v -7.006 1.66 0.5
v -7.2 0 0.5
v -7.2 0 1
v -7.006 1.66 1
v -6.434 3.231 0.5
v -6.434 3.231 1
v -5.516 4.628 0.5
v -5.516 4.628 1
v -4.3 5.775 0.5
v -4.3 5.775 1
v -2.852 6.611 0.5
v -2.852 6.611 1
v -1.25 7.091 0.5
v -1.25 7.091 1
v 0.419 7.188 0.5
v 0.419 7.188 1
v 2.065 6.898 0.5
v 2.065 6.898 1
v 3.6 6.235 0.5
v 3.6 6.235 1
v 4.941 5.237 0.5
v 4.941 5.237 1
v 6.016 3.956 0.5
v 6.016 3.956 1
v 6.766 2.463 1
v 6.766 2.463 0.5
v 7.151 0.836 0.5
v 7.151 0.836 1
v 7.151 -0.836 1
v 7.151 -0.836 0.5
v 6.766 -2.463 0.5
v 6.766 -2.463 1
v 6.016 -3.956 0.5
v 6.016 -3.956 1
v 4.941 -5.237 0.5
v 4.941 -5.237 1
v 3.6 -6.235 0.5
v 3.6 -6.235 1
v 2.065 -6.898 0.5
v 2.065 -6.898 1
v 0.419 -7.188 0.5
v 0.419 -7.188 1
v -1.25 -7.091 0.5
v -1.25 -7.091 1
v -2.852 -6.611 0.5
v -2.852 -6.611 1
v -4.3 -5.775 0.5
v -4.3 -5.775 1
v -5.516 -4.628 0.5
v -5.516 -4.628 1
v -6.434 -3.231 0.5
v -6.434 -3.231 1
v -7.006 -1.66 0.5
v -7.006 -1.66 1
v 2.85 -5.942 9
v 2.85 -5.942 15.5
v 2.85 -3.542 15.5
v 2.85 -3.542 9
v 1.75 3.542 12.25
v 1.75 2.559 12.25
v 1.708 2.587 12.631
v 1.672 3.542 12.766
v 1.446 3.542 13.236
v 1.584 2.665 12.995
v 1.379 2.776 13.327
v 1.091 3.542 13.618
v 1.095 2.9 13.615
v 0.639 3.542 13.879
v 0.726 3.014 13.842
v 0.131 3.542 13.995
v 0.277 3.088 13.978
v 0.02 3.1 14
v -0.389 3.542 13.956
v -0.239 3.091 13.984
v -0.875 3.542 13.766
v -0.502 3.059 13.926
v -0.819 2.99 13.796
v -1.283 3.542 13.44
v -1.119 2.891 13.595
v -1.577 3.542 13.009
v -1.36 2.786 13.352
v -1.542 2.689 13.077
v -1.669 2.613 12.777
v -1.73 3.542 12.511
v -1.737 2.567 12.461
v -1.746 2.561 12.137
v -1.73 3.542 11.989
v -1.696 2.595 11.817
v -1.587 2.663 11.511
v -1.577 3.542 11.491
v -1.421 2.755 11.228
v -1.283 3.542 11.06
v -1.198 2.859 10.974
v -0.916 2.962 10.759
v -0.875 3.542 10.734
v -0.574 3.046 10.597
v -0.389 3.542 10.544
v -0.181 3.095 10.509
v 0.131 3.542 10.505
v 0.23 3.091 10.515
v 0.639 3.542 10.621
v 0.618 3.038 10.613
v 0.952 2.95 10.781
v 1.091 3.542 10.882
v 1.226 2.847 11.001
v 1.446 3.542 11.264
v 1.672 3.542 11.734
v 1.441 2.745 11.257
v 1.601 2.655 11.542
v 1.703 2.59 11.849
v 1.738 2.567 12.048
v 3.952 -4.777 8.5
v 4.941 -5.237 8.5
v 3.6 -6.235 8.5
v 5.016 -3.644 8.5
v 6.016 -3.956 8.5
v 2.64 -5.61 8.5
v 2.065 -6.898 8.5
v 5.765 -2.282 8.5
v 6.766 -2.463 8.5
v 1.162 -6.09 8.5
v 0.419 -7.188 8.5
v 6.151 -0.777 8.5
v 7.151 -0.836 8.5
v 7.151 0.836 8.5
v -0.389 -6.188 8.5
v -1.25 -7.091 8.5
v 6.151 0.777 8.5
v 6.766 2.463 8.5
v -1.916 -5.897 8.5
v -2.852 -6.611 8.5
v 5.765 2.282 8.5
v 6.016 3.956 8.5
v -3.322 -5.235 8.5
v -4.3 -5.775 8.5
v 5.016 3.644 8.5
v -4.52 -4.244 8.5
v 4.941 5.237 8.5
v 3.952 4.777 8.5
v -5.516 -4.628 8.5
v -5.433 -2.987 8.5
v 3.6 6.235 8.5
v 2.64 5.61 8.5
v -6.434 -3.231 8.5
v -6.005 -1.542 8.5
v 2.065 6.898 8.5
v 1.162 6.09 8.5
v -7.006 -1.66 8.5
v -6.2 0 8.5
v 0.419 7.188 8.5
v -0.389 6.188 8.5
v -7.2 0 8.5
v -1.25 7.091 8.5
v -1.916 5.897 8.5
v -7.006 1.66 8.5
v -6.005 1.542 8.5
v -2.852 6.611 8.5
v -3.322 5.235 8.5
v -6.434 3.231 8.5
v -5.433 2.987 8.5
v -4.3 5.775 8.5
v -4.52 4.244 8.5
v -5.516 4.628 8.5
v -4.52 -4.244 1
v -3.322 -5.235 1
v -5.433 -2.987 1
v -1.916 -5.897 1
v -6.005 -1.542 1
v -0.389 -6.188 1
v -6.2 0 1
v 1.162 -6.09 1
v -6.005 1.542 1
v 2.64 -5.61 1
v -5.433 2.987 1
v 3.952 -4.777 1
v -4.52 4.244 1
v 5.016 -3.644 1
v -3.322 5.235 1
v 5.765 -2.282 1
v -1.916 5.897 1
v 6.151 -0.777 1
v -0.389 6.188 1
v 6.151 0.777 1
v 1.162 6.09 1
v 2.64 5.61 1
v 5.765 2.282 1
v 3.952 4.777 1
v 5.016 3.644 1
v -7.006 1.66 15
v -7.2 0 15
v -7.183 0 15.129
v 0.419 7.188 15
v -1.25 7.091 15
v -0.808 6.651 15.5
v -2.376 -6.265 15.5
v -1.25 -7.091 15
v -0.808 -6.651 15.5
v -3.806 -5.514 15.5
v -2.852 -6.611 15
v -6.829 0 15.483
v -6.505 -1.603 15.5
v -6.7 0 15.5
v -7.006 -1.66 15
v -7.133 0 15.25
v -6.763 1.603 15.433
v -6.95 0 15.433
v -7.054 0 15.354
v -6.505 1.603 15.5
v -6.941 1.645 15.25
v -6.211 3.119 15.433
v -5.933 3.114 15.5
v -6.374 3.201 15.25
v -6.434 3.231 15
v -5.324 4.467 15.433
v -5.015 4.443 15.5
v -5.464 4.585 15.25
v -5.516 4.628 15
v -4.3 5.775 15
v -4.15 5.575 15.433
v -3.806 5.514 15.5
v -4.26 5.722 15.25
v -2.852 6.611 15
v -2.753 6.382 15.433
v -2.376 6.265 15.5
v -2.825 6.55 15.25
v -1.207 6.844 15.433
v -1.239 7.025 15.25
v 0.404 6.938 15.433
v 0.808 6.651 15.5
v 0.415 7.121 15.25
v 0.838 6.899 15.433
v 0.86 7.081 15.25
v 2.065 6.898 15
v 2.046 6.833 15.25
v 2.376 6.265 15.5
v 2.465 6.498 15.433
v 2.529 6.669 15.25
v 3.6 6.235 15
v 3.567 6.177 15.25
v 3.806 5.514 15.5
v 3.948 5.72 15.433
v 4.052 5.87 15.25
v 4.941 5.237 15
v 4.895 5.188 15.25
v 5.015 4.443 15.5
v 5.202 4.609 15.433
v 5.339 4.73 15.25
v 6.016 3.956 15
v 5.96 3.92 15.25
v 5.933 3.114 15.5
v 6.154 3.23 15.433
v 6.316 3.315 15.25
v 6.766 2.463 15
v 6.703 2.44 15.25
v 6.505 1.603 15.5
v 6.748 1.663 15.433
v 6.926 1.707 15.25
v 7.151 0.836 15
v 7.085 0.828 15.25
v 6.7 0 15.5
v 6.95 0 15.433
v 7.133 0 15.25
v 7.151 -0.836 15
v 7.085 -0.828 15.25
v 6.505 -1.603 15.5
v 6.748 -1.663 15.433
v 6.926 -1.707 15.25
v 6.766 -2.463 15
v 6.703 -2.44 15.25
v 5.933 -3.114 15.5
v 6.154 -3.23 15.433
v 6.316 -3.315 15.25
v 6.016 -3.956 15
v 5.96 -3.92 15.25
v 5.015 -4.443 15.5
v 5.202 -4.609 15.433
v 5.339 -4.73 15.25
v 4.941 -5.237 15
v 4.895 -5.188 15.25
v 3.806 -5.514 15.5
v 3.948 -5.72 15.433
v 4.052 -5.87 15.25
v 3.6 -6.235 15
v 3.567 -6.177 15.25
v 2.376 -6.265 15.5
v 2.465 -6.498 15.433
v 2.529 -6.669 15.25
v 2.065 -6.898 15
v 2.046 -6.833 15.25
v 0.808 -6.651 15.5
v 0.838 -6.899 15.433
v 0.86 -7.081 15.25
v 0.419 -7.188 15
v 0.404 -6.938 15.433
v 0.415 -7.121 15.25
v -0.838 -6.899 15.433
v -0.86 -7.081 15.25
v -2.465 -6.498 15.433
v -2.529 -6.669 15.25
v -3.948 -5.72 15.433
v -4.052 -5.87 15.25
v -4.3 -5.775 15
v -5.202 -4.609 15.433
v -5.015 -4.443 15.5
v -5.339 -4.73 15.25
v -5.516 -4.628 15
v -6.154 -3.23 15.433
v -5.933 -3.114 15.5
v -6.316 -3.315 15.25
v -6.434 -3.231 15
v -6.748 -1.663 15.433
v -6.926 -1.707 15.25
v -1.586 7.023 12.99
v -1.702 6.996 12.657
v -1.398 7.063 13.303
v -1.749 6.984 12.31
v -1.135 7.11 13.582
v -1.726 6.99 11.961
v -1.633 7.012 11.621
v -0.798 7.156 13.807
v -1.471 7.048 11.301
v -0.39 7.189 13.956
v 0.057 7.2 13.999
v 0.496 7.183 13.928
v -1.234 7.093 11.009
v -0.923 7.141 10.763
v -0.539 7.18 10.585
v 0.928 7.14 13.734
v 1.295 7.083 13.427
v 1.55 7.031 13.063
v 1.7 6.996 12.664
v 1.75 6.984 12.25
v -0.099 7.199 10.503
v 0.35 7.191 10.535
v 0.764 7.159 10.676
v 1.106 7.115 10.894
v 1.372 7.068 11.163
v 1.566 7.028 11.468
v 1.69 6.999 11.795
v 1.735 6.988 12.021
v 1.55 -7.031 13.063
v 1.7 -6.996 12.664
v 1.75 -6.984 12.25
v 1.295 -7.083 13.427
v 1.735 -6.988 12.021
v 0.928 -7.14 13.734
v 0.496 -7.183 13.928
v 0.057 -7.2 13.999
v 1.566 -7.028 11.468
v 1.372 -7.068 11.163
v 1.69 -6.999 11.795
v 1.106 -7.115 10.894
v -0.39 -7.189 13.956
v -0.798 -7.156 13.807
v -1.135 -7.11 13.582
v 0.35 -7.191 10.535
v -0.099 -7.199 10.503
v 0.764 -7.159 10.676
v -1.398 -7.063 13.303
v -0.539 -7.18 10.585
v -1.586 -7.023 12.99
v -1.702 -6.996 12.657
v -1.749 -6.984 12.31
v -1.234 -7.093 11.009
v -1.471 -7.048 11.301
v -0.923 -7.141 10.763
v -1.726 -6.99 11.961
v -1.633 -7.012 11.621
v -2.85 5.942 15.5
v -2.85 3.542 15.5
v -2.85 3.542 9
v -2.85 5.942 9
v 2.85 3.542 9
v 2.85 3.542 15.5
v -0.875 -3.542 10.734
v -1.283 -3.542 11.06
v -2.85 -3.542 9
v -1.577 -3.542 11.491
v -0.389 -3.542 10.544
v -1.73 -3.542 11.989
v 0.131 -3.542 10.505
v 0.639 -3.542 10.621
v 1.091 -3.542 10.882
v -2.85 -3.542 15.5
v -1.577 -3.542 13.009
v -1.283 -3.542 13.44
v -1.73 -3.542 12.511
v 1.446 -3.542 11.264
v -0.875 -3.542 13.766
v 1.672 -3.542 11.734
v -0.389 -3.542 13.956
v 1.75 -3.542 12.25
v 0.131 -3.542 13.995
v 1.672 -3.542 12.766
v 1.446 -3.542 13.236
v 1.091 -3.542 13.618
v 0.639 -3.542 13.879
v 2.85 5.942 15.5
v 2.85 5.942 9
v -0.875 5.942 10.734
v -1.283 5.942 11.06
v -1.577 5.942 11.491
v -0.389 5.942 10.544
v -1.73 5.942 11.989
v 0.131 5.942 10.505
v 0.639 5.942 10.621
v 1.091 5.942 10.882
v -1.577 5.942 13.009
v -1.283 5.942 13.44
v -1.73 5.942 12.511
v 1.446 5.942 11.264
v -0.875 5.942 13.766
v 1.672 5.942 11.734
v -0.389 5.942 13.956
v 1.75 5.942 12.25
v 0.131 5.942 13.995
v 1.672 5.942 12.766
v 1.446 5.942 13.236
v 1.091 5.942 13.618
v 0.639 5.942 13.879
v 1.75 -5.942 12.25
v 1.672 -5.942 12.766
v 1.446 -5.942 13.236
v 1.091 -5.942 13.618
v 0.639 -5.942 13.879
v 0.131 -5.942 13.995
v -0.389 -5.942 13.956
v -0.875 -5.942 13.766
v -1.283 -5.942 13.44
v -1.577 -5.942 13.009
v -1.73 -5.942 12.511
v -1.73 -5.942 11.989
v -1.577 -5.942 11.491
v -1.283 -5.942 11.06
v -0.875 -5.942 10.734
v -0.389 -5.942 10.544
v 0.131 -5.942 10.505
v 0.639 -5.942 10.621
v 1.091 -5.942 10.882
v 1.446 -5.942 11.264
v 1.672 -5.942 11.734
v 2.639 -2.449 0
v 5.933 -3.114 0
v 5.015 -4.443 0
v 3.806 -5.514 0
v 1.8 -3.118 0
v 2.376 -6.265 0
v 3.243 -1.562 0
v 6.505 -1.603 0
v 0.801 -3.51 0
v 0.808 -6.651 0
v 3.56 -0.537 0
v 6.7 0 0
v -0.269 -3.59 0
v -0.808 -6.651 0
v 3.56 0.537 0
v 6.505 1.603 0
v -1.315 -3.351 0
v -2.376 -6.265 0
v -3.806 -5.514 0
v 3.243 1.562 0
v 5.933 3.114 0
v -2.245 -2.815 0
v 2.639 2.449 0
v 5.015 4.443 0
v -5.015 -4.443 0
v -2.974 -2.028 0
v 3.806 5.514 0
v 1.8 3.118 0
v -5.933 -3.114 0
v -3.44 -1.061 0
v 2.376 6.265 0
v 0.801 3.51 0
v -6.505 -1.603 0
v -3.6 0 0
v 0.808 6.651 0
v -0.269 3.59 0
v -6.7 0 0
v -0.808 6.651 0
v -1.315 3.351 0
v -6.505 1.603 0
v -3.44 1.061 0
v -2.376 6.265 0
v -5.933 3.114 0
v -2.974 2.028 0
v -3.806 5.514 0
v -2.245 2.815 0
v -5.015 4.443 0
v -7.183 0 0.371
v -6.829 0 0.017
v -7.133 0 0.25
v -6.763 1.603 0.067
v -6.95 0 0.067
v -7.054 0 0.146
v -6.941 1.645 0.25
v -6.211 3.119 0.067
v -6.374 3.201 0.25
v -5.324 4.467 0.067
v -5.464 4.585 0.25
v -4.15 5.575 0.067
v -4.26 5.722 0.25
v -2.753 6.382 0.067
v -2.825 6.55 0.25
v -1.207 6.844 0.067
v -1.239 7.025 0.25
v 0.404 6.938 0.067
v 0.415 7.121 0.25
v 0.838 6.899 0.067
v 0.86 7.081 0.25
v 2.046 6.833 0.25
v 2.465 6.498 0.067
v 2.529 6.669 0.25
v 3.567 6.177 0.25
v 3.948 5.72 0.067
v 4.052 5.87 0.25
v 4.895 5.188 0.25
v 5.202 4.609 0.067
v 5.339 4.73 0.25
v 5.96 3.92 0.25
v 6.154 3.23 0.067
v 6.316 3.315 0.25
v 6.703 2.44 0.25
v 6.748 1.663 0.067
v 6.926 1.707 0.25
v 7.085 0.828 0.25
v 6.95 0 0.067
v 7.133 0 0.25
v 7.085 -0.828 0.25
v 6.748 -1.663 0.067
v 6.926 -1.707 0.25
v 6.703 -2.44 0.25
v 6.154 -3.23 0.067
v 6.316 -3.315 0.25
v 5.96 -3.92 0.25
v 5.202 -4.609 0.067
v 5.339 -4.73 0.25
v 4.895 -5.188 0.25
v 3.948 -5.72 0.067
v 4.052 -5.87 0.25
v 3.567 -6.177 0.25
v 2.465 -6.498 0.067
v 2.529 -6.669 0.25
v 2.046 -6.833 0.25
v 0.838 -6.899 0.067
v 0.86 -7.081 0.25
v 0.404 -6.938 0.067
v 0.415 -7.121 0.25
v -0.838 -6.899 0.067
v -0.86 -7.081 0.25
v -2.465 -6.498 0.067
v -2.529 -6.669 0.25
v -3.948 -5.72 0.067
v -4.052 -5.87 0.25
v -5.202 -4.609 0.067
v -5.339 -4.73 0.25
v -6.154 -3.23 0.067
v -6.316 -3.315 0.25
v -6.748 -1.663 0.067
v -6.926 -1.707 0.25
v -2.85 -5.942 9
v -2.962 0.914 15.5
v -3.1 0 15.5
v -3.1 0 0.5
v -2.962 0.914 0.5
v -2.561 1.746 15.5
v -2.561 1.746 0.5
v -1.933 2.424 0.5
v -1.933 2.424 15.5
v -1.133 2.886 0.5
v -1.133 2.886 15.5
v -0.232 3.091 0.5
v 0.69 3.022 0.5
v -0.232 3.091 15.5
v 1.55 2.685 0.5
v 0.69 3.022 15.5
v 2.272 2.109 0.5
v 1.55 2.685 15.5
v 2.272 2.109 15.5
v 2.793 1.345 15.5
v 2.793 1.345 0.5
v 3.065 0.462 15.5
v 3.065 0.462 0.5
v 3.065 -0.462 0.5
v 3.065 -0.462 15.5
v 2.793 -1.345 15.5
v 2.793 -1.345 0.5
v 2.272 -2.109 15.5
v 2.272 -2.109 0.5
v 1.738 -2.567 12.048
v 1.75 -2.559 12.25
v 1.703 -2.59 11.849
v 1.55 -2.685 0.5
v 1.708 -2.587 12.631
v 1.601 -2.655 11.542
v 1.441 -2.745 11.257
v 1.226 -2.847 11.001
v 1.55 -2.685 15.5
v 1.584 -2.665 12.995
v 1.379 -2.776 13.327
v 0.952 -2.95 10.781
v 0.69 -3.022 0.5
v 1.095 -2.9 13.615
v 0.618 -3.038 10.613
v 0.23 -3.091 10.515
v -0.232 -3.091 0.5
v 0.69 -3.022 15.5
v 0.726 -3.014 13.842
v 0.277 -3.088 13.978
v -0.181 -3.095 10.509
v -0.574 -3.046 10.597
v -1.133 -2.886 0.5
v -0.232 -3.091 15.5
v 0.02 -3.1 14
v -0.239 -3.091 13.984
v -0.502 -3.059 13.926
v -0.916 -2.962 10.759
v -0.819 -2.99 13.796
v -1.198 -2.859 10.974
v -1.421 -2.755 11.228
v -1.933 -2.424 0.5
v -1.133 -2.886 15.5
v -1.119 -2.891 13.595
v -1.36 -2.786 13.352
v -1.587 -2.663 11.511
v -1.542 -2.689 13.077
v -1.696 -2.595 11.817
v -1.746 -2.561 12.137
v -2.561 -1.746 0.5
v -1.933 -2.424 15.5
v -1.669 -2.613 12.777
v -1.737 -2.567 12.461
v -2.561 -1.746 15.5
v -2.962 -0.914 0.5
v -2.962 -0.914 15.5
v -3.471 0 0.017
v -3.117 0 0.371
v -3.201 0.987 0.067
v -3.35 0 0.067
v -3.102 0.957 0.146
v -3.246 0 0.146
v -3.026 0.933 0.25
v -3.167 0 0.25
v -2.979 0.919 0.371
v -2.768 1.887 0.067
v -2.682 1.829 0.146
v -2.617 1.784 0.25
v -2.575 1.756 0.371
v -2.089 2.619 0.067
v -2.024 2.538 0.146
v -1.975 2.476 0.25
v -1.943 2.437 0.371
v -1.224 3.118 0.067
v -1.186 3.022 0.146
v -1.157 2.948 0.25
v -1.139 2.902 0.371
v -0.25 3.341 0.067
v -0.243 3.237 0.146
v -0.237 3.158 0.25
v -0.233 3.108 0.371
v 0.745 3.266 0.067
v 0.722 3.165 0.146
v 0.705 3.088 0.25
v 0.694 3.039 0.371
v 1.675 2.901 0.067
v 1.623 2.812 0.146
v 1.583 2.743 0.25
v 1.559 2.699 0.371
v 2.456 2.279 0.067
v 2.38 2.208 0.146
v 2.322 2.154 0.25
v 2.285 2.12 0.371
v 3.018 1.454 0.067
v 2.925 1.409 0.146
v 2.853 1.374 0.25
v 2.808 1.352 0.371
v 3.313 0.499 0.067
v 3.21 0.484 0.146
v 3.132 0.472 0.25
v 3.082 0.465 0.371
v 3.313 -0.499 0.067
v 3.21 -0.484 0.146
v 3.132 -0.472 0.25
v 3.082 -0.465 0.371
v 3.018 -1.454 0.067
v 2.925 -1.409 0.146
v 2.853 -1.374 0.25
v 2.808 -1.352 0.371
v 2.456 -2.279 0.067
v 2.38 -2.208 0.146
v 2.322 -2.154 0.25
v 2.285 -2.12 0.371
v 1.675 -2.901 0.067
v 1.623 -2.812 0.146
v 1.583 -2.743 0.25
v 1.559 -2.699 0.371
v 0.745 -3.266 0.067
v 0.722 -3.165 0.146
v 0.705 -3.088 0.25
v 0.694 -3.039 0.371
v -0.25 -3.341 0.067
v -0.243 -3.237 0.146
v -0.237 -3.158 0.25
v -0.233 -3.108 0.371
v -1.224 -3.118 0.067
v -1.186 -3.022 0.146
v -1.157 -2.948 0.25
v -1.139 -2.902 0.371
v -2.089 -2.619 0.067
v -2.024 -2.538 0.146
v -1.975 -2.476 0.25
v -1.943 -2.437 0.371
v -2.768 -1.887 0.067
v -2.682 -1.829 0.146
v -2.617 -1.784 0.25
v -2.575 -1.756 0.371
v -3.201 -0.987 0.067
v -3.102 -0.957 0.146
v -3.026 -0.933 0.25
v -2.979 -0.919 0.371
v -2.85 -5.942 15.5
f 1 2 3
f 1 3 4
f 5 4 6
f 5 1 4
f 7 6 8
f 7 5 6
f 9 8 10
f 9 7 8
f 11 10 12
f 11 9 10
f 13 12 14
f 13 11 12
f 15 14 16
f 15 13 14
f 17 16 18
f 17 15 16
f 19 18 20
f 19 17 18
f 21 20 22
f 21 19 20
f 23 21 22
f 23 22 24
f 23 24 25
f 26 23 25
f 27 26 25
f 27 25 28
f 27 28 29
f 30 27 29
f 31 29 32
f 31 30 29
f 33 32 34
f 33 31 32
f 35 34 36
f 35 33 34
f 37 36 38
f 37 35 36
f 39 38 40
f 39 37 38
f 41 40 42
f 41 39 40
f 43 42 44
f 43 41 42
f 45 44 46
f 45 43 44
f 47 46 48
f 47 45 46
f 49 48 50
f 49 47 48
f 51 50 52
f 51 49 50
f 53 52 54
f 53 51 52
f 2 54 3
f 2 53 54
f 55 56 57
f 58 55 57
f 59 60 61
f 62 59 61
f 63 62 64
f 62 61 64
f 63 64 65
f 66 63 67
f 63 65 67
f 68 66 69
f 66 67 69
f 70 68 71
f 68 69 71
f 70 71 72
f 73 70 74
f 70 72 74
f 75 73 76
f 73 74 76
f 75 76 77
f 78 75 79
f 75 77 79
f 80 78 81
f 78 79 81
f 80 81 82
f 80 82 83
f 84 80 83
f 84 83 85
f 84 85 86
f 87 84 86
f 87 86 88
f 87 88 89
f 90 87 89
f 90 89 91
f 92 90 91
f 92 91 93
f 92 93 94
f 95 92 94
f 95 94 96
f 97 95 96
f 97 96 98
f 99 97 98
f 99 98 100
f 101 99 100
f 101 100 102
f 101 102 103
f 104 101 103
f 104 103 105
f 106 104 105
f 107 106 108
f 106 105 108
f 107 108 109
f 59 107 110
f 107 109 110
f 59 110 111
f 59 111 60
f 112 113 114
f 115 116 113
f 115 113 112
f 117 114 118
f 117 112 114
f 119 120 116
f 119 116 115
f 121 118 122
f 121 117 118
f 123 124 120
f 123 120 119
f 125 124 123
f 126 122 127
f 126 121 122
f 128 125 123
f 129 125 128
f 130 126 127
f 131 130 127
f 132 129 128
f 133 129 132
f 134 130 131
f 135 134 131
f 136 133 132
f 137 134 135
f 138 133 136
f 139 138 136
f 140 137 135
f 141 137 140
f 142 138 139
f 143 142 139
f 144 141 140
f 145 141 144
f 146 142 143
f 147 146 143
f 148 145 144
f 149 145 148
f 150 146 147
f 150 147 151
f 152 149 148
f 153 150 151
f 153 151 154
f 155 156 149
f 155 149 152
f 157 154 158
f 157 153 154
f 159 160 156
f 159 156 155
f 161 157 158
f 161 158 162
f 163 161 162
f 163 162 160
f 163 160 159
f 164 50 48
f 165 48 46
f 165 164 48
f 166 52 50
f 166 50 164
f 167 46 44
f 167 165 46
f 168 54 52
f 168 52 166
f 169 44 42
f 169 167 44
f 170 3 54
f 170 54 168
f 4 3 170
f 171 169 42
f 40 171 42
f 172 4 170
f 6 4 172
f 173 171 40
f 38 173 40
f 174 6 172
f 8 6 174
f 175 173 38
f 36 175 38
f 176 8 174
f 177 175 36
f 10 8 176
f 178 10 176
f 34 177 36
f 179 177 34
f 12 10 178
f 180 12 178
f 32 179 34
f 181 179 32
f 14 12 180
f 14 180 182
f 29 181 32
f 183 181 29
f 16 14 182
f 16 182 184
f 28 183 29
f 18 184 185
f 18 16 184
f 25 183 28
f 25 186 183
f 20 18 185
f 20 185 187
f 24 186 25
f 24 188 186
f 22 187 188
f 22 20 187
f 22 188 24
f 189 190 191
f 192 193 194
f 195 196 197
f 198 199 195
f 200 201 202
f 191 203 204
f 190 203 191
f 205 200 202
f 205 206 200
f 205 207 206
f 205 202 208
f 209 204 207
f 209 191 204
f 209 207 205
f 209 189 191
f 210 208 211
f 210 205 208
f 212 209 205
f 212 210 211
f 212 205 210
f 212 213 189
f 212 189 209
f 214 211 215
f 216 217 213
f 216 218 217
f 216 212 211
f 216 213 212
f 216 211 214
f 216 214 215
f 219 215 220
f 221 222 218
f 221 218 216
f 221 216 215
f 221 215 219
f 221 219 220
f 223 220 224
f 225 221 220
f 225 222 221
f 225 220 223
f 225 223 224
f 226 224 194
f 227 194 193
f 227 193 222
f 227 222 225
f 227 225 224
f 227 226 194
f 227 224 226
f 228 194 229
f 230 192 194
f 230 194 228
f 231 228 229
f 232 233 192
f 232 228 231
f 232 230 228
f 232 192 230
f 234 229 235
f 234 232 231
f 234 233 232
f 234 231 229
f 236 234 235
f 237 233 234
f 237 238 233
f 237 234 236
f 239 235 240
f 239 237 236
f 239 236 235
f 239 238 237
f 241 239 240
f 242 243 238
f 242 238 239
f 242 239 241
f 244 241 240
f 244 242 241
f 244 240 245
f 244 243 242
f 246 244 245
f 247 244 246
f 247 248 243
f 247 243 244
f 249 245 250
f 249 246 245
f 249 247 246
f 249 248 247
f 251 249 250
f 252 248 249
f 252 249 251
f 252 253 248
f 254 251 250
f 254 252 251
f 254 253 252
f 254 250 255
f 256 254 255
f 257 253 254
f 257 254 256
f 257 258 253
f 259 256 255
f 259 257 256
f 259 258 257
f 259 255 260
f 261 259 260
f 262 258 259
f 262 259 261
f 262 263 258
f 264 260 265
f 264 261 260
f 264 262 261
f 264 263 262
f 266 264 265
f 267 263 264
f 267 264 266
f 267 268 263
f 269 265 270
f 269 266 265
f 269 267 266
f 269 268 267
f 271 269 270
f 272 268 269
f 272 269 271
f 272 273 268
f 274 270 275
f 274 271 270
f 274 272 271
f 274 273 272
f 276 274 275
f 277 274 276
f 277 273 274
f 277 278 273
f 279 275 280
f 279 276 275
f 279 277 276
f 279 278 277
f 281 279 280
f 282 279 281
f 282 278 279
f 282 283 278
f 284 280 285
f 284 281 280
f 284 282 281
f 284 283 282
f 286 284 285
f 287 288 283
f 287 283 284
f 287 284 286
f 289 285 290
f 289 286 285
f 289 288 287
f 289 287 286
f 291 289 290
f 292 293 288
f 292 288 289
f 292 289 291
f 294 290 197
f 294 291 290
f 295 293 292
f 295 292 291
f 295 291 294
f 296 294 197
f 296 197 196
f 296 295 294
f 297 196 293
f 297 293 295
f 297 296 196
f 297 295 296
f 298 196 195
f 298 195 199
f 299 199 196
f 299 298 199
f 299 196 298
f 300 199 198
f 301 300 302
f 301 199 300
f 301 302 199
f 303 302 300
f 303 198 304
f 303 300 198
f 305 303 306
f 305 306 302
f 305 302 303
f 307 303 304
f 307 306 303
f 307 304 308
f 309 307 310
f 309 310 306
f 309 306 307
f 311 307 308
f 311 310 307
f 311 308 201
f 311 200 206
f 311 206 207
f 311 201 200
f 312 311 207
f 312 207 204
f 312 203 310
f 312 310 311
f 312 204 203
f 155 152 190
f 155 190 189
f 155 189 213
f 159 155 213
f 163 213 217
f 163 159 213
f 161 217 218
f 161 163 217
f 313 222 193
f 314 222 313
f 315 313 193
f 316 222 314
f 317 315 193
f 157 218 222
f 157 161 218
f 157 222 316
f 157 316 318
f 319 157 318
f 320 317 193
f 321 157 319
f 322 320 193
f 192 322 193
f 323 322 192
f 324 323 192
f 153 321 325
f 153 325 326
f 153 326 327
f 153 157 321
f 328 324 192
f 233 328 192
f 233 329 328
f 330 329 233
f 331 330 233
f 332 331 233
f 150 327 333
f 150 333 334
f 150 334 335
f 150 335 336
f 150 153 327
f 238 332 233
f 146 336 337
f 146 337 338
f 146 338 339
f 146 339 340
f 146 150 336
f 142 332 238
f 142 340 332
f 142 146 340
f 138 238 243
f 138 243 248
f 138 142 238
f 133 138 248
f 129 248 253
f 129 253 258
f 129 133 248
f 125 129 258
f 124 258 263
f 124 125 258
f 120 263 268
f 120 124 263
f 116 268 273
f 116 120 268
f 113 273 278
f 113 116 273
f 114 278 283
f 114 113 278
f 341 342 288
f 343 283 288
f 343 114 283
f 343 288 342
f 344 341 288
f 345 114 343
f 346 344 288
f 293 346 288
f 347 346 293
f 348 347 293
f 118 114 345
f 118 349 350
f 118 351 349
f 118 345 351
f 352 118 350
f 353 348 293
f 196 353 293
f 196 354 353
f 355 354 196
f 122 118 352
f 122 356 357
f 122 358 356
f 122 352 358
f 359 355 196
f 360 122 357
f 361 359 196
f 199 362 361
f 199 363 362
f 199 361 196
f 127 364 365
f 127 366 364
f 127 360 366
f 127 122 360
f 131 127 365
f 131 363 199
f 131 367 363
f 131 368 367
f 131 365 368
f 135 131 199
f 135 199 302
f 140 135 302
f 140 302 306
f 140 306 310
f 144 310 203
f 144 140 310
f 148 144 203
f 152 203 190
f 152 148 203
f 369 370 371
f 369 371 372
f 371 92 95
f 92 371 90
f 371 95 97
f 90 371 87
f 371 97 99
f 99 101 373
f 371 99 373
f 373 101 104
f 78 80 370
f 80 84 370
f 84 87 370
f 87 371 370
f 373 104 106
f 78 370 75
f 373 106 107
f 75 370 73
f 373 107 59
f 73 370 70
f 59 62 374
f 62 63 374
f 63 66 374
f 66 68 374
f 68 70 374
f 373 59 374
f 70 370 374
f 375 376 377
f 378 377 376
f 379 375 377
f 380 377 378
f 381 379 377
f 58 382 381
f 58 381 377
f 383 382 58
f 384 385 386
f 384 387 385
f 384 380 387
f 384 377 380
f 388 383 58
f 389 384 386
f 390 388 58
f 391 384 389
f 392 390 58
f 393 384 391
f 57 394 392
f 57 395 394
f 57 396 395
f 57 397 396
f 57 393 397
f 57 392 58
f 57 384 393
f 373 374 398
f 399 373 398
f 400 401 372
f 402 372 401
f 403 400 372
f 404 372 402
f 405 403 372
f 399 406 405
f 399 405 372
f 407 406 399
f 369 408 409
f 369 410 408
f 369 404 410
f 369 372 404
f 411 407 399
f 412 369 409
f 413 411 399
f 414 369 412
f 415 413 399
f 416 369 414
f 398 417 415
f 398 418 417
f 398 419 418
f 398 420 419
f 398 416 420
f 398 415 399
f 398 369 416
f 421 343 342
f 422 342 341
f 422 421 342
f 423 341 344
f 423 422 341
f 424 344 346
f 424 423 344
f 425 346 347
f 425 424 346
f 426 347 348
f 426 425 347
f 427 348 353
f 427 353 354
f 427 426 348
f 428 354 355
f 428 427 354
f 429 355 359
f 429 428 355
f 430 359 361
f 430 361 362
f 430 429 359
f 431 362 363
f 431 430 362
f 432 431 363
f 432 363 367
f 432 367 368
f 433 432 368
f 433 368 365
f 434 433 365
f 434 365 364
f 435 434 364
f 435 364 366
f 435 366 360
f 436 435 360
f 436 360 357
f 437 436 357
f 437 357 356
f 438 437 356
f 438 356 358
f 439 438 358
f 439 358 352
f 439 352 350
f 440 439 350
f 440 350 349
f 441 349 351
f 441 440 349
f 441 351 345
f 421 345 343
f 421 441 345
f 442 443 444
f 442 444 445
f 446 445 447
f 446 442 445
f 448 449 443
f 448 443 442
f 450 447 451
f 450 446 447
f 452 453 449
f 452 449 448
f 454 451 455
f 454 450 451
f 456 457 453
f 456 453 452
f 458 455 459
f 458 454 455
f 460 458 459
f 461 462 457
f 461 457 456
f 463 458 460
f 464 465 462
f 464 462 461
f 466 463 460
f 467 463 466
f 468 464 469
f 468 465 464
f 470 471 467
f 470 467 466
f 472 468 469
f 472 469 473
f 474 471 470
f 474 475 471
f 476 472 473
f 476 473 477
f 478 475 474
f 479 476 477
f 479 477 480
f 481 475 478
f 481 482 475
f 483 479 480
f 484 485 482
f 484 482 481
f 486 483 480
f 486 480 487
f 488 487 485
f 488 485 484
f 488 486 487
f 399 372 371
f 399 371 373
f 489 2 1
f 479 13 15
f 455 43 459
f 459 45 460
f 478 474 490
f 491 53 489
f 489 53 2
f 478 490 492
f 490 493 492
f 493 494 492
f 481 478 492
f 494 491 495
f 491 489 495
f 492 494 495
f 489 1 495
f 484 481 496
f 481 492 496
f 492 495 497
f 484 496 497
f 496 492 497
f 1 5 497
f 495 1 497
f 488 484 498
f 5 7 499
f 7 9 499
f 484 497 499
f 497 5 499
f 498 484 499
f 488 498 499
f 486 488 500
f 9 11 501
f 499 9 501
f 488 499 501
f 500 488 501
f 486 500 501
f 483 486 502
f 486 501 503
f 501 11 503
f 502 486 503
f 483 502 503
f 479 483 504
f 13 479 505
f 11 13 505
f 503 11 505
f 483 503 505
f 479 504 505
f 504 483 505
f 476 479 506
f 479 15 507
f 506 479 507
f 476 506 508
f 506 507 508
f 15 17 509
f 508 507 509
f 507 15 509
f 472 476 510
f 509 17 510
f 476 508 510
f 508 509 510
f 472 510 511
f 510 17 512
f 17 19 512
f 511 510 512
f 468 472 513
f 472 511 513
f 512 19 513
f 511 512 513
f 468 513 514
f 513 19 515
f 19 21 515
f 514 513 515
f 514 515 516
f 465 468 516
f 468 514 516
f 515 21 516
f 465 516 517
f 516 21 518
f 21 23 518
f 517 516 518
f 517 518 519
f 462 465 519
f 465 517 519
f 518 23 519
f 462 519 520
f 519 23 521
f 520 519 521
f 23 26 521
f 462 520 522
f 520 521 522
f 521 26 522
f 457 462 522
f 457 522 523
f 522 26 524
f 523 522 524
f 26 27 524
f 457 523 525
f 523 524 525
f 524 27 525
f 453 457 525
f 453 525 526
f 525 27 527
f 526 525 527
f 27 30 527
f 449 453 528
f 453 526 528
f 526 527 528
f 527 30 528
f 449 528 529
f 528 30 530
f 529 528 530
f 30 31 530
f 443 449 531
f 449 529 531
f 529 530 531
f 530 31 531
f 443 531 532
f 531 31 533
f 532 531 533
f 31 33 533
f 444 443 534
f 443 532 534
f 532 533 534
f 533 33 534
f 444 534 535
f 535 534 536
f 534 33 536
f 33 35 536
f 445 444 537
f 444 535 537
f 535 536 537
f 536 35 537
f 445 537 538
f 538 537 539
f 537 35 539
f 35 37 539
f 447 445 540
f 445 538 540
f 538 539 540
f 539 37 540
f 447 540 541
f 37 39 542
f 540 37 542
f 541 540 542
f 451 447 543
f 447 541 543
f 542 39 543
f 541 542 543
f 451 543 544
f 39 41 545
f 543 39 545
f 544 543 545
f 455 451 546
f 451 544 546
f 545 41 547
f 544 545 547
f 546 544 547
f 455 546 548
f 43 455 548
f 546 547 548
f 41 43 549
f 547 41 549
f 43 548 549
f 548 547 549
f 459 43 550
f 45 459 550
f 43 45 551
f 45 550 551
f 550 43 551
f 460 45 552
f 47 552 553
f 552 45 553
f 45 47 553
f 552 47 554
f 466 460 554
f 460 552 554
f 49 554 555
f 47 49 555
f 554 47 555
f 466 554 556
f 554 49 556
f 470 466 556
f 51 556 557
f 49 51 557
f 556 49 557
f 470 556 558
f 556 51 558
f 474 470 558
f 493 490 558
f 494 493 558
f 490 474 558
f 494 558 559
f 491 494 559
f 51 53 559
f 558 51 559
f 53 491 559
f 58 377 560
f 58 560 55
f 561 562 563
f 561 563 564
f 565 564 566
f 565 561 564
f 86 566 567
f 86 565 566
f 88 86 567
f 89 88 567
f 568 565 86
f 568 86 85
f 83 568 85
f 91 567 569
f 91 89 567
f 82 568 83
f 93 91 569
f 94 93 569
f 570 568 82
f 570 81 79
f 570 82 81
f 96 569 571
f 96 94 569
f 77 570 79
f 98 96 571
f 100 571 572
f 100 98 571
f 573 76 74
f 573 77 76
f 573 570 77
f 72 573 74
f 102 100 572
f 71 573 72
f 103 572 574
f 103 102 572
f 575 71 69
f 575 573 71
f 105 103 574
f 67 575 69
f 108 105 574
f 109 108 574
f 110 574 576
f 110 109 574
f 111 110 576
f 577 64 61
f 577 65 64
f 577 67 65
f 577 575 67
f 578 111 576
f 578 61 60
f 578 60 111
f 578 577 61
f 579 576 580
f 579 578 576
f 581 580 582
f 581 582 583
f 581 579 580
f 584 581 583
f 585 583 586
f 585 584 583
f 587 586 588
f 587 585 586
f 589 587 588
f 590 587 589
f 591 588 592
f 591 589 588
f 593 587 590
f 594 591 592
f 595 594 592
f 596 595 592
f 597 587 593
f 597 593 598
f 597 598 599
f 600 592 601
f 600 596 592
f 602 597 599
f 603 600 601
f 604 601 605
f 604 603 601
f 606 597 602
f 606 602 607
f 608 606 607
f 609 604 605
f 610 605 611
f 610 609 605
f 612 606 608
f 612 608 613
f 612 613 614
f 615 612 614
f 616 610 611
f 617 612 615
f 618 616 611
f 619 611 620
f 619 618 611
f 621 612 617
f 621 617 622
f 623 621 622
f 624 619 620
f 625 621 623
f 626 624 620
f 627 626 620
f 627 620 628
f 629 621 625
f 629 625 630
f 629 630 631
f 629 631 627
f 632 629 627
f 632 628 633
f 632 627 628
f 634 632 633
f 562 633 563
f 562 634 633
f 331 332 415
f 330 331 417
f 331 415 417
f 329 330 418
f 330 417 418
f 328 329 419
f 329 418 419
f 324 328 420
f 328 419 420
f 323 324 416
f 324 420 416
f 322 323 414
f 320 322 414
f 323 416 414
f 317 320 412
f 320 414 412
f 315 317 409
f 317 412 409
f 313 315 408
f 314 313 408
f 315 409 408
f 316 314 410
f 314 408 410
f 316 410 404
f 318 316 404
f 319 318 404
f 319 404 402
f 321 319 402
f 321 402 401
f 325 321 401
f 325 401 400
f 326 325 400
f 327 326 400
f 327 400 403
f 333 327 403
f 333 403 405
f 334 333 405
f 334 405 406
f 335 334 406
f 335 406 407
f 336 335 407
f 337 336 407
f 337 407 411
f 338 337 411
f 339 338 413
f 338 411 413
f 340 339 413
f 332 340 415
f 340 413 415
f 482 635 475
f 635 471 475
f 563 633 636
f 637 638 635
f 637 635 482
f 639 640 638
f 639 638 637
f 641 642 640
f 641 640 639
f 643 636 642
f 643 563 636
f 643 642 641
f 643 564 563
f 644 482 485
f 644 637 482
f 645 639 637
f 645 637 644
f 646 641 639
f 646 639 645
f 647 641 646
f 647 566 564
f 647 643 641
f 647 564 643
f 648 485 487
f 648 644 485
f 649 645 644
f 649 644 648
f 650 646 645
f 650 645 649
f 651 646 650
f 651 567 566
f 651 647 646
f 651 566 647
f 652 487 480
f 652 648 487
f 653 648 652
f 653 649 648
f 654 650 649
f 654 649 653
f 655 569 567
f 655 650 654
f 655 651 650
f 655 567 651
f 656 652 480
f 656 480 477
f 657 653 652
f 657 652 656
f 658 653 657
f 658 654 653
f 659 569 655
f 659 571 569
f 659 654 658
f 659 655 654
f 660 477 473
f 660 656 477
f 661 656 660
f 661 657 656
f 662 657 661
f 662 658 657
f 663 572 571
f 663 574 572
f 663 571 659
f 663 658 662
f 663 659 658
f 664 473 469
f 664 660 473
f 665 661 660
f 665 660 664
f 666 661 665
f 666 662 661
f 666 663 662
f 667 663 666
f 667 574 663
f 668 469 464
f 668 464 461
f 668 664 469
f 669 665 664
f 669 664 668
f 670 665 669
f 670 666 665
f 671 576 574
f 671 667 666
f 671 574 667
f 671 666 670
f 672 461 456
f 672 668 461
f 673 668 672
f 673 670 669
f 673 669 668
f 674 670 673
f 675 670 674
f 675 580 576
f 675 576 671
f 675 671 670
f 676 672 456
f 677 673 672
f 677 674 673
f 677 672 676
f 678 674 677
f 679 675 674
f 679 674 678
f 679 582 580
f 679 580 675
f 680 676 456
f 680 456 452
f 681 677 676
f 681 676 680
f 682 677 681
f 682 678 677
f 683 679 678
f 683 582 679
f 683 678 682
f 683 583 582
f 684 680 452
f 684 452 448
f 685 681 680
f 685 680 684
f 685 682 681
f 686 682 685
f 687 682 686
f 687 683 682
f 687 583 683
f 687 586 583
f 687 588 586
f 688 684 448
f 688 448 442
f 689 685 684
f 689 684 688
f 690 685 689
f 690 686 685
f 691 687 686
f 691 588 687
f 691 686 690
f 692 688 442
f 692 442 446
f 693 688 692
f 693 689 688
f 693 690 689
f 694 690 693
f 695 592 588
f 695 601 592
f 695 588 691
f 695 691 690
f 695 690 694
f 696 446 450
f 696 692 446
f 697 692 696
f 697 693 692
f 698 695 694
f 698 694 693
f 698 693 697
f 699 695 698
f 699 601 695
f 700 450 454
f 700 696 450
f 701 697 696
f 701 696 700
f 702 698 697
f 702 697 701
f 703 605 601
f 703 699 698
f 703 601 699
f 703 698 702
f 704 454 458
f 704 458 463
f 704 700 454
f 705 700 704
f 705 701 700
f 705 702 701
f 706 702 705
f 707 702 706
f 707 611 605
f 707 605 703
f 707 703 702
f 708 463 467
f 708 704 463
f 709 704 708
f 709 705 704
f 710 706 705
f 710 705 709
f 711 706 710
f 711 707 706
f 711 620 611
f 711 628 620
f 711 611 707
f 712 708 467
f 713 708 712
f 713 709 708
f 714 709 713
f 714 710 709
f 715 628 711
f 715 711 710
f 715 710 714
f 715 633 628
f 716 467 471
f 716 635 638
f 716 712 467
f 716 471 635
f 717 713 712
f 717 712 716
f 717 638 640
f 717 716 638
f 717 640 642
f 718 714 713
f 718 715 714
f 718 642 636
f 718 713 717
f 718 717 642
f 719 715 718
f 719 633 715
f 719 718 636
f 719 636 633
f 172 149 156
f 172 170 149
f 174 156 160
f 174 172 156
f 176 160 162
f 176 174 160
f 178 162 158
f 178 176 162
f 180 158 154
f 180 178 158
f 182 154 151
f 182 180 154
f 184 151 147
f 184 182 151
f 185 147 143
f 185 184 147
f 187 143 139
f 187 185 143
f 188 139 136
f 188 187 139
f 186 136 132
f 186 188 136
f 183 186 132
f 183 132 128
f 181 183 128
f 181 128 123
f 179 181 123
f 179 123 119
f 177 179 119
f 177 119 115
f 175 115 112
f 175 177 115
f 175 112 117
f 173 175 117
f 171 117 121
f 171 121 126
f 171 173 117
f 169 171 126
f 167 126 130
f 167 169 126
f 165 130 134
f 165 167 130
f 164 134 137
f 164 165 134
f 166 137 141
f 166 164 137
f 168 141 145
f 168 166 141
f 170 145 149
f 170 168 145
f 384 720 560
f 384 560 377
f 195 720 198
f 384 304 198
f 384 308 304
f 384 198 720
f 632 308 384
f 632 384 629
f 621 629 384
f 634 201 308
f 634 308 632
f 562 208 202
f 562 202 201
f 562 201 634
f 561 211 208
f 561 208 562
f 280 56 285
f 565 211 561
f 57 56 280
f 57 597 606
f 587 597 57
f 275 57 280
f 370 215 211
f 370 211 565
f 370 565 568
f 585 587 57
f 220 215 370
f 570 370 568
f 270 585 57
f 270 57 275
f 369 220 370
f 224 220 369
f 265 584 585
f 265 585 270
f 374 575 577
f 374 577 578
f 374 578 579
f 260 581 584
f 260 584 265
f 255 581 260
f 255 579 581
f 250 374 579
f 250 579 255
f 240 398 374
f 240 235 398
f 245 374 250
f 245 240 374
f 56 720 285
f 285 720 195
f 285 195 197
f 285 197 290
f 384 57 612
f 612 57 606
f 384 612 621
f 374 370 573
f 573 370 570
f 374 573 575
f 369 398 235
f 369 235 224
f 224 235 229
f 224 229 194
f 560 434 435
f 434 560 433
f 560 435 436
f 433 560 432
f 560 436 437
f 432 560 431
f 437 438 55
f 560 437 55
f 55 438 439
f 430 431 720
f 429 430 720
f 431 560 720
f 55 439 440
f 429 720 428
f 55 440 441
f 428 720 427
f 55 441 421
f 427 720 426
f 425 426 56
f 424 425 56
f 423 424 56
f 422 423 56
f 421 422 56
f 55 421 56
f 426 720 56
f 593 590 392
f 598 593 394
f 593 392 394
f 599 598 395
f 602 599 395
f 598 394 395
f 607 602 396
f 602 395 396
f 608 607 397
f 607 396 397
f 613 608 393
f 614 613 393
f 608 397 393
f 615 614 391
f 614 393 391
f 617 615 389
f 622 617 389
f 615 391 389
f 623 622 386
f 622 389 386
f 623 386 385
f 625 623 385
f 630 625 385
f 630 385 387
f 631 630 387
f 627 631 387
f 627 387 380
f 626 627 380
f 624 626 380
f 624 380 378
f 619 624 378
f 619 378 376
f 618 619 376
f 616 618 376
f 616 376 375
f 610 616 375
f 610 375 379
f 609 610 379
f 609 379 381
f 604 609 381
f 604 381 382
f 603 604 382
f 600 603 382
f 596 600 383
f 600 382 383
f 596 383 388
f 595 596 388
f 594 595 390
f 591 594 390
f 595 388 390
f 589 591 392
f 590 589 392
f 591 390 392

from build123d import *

# Parameters (mm, degrees)
F2_W          = 5.7
F2_H          = 2.4
F3_DEPTH      = 6.5
F4_R          = 1.75
F5_DEPTH      = 10.743375338
F5_DEPTH_BACK = 3.658624662
F6_R          = 0.5


with BuildPart() as f1:
    # F0 (on Front) → F1 (revolve)
    with BuildSketch(Plane.XZ):
        Polygon((-7.2, 0), (-3.1, 0), (-3.1, 15.5), (-7.2, 15.5), (-7.2, 8.5), (-6.2, 8.5), (-6.2, 1), (-7.2, 1), align=None)
    revolve(axis=Axis((0, 0, 7.75), (0, 0, -1)))

    # F2 (on face) → F3 (cut)
    with BuildSketch(Plane.XY.offset(15.5)):
        with Locations((0, -4.742375338)):
            Rectangle(F2_W, F2_H)
        with Locations((0, 4.742375338)):
            Rectangle(F2_W, F2_H)
    extrude(amount=-F3_DEPTH, mode=Mode.SUBTRACT)

    # F4 (on face) → F5 (cut, two sides)
    with BuildSketch(Plane.XZ.offset(3.542375338)) as f5_sk:
        with Locations((0, 12.25)):
            Circle(F4_R)
    extrude(amount=-F5_DEPTH, mode=Mode.SUBTRACT)
    extrude(f5_sk.sketch, amount=F5_DEPTH_BACK, mode=Mode.SUBTRACT)

    # F6
    f6_edges = [f1.edges().sort_by_distance(p)[0] for p in [
        (7.2, 0, 0),
        (7.2, 0, 15.5),
        (3.1, 0, 0),
    ]]
    fillet(f6_edges, radius=F6_R)


solid = f1.part
